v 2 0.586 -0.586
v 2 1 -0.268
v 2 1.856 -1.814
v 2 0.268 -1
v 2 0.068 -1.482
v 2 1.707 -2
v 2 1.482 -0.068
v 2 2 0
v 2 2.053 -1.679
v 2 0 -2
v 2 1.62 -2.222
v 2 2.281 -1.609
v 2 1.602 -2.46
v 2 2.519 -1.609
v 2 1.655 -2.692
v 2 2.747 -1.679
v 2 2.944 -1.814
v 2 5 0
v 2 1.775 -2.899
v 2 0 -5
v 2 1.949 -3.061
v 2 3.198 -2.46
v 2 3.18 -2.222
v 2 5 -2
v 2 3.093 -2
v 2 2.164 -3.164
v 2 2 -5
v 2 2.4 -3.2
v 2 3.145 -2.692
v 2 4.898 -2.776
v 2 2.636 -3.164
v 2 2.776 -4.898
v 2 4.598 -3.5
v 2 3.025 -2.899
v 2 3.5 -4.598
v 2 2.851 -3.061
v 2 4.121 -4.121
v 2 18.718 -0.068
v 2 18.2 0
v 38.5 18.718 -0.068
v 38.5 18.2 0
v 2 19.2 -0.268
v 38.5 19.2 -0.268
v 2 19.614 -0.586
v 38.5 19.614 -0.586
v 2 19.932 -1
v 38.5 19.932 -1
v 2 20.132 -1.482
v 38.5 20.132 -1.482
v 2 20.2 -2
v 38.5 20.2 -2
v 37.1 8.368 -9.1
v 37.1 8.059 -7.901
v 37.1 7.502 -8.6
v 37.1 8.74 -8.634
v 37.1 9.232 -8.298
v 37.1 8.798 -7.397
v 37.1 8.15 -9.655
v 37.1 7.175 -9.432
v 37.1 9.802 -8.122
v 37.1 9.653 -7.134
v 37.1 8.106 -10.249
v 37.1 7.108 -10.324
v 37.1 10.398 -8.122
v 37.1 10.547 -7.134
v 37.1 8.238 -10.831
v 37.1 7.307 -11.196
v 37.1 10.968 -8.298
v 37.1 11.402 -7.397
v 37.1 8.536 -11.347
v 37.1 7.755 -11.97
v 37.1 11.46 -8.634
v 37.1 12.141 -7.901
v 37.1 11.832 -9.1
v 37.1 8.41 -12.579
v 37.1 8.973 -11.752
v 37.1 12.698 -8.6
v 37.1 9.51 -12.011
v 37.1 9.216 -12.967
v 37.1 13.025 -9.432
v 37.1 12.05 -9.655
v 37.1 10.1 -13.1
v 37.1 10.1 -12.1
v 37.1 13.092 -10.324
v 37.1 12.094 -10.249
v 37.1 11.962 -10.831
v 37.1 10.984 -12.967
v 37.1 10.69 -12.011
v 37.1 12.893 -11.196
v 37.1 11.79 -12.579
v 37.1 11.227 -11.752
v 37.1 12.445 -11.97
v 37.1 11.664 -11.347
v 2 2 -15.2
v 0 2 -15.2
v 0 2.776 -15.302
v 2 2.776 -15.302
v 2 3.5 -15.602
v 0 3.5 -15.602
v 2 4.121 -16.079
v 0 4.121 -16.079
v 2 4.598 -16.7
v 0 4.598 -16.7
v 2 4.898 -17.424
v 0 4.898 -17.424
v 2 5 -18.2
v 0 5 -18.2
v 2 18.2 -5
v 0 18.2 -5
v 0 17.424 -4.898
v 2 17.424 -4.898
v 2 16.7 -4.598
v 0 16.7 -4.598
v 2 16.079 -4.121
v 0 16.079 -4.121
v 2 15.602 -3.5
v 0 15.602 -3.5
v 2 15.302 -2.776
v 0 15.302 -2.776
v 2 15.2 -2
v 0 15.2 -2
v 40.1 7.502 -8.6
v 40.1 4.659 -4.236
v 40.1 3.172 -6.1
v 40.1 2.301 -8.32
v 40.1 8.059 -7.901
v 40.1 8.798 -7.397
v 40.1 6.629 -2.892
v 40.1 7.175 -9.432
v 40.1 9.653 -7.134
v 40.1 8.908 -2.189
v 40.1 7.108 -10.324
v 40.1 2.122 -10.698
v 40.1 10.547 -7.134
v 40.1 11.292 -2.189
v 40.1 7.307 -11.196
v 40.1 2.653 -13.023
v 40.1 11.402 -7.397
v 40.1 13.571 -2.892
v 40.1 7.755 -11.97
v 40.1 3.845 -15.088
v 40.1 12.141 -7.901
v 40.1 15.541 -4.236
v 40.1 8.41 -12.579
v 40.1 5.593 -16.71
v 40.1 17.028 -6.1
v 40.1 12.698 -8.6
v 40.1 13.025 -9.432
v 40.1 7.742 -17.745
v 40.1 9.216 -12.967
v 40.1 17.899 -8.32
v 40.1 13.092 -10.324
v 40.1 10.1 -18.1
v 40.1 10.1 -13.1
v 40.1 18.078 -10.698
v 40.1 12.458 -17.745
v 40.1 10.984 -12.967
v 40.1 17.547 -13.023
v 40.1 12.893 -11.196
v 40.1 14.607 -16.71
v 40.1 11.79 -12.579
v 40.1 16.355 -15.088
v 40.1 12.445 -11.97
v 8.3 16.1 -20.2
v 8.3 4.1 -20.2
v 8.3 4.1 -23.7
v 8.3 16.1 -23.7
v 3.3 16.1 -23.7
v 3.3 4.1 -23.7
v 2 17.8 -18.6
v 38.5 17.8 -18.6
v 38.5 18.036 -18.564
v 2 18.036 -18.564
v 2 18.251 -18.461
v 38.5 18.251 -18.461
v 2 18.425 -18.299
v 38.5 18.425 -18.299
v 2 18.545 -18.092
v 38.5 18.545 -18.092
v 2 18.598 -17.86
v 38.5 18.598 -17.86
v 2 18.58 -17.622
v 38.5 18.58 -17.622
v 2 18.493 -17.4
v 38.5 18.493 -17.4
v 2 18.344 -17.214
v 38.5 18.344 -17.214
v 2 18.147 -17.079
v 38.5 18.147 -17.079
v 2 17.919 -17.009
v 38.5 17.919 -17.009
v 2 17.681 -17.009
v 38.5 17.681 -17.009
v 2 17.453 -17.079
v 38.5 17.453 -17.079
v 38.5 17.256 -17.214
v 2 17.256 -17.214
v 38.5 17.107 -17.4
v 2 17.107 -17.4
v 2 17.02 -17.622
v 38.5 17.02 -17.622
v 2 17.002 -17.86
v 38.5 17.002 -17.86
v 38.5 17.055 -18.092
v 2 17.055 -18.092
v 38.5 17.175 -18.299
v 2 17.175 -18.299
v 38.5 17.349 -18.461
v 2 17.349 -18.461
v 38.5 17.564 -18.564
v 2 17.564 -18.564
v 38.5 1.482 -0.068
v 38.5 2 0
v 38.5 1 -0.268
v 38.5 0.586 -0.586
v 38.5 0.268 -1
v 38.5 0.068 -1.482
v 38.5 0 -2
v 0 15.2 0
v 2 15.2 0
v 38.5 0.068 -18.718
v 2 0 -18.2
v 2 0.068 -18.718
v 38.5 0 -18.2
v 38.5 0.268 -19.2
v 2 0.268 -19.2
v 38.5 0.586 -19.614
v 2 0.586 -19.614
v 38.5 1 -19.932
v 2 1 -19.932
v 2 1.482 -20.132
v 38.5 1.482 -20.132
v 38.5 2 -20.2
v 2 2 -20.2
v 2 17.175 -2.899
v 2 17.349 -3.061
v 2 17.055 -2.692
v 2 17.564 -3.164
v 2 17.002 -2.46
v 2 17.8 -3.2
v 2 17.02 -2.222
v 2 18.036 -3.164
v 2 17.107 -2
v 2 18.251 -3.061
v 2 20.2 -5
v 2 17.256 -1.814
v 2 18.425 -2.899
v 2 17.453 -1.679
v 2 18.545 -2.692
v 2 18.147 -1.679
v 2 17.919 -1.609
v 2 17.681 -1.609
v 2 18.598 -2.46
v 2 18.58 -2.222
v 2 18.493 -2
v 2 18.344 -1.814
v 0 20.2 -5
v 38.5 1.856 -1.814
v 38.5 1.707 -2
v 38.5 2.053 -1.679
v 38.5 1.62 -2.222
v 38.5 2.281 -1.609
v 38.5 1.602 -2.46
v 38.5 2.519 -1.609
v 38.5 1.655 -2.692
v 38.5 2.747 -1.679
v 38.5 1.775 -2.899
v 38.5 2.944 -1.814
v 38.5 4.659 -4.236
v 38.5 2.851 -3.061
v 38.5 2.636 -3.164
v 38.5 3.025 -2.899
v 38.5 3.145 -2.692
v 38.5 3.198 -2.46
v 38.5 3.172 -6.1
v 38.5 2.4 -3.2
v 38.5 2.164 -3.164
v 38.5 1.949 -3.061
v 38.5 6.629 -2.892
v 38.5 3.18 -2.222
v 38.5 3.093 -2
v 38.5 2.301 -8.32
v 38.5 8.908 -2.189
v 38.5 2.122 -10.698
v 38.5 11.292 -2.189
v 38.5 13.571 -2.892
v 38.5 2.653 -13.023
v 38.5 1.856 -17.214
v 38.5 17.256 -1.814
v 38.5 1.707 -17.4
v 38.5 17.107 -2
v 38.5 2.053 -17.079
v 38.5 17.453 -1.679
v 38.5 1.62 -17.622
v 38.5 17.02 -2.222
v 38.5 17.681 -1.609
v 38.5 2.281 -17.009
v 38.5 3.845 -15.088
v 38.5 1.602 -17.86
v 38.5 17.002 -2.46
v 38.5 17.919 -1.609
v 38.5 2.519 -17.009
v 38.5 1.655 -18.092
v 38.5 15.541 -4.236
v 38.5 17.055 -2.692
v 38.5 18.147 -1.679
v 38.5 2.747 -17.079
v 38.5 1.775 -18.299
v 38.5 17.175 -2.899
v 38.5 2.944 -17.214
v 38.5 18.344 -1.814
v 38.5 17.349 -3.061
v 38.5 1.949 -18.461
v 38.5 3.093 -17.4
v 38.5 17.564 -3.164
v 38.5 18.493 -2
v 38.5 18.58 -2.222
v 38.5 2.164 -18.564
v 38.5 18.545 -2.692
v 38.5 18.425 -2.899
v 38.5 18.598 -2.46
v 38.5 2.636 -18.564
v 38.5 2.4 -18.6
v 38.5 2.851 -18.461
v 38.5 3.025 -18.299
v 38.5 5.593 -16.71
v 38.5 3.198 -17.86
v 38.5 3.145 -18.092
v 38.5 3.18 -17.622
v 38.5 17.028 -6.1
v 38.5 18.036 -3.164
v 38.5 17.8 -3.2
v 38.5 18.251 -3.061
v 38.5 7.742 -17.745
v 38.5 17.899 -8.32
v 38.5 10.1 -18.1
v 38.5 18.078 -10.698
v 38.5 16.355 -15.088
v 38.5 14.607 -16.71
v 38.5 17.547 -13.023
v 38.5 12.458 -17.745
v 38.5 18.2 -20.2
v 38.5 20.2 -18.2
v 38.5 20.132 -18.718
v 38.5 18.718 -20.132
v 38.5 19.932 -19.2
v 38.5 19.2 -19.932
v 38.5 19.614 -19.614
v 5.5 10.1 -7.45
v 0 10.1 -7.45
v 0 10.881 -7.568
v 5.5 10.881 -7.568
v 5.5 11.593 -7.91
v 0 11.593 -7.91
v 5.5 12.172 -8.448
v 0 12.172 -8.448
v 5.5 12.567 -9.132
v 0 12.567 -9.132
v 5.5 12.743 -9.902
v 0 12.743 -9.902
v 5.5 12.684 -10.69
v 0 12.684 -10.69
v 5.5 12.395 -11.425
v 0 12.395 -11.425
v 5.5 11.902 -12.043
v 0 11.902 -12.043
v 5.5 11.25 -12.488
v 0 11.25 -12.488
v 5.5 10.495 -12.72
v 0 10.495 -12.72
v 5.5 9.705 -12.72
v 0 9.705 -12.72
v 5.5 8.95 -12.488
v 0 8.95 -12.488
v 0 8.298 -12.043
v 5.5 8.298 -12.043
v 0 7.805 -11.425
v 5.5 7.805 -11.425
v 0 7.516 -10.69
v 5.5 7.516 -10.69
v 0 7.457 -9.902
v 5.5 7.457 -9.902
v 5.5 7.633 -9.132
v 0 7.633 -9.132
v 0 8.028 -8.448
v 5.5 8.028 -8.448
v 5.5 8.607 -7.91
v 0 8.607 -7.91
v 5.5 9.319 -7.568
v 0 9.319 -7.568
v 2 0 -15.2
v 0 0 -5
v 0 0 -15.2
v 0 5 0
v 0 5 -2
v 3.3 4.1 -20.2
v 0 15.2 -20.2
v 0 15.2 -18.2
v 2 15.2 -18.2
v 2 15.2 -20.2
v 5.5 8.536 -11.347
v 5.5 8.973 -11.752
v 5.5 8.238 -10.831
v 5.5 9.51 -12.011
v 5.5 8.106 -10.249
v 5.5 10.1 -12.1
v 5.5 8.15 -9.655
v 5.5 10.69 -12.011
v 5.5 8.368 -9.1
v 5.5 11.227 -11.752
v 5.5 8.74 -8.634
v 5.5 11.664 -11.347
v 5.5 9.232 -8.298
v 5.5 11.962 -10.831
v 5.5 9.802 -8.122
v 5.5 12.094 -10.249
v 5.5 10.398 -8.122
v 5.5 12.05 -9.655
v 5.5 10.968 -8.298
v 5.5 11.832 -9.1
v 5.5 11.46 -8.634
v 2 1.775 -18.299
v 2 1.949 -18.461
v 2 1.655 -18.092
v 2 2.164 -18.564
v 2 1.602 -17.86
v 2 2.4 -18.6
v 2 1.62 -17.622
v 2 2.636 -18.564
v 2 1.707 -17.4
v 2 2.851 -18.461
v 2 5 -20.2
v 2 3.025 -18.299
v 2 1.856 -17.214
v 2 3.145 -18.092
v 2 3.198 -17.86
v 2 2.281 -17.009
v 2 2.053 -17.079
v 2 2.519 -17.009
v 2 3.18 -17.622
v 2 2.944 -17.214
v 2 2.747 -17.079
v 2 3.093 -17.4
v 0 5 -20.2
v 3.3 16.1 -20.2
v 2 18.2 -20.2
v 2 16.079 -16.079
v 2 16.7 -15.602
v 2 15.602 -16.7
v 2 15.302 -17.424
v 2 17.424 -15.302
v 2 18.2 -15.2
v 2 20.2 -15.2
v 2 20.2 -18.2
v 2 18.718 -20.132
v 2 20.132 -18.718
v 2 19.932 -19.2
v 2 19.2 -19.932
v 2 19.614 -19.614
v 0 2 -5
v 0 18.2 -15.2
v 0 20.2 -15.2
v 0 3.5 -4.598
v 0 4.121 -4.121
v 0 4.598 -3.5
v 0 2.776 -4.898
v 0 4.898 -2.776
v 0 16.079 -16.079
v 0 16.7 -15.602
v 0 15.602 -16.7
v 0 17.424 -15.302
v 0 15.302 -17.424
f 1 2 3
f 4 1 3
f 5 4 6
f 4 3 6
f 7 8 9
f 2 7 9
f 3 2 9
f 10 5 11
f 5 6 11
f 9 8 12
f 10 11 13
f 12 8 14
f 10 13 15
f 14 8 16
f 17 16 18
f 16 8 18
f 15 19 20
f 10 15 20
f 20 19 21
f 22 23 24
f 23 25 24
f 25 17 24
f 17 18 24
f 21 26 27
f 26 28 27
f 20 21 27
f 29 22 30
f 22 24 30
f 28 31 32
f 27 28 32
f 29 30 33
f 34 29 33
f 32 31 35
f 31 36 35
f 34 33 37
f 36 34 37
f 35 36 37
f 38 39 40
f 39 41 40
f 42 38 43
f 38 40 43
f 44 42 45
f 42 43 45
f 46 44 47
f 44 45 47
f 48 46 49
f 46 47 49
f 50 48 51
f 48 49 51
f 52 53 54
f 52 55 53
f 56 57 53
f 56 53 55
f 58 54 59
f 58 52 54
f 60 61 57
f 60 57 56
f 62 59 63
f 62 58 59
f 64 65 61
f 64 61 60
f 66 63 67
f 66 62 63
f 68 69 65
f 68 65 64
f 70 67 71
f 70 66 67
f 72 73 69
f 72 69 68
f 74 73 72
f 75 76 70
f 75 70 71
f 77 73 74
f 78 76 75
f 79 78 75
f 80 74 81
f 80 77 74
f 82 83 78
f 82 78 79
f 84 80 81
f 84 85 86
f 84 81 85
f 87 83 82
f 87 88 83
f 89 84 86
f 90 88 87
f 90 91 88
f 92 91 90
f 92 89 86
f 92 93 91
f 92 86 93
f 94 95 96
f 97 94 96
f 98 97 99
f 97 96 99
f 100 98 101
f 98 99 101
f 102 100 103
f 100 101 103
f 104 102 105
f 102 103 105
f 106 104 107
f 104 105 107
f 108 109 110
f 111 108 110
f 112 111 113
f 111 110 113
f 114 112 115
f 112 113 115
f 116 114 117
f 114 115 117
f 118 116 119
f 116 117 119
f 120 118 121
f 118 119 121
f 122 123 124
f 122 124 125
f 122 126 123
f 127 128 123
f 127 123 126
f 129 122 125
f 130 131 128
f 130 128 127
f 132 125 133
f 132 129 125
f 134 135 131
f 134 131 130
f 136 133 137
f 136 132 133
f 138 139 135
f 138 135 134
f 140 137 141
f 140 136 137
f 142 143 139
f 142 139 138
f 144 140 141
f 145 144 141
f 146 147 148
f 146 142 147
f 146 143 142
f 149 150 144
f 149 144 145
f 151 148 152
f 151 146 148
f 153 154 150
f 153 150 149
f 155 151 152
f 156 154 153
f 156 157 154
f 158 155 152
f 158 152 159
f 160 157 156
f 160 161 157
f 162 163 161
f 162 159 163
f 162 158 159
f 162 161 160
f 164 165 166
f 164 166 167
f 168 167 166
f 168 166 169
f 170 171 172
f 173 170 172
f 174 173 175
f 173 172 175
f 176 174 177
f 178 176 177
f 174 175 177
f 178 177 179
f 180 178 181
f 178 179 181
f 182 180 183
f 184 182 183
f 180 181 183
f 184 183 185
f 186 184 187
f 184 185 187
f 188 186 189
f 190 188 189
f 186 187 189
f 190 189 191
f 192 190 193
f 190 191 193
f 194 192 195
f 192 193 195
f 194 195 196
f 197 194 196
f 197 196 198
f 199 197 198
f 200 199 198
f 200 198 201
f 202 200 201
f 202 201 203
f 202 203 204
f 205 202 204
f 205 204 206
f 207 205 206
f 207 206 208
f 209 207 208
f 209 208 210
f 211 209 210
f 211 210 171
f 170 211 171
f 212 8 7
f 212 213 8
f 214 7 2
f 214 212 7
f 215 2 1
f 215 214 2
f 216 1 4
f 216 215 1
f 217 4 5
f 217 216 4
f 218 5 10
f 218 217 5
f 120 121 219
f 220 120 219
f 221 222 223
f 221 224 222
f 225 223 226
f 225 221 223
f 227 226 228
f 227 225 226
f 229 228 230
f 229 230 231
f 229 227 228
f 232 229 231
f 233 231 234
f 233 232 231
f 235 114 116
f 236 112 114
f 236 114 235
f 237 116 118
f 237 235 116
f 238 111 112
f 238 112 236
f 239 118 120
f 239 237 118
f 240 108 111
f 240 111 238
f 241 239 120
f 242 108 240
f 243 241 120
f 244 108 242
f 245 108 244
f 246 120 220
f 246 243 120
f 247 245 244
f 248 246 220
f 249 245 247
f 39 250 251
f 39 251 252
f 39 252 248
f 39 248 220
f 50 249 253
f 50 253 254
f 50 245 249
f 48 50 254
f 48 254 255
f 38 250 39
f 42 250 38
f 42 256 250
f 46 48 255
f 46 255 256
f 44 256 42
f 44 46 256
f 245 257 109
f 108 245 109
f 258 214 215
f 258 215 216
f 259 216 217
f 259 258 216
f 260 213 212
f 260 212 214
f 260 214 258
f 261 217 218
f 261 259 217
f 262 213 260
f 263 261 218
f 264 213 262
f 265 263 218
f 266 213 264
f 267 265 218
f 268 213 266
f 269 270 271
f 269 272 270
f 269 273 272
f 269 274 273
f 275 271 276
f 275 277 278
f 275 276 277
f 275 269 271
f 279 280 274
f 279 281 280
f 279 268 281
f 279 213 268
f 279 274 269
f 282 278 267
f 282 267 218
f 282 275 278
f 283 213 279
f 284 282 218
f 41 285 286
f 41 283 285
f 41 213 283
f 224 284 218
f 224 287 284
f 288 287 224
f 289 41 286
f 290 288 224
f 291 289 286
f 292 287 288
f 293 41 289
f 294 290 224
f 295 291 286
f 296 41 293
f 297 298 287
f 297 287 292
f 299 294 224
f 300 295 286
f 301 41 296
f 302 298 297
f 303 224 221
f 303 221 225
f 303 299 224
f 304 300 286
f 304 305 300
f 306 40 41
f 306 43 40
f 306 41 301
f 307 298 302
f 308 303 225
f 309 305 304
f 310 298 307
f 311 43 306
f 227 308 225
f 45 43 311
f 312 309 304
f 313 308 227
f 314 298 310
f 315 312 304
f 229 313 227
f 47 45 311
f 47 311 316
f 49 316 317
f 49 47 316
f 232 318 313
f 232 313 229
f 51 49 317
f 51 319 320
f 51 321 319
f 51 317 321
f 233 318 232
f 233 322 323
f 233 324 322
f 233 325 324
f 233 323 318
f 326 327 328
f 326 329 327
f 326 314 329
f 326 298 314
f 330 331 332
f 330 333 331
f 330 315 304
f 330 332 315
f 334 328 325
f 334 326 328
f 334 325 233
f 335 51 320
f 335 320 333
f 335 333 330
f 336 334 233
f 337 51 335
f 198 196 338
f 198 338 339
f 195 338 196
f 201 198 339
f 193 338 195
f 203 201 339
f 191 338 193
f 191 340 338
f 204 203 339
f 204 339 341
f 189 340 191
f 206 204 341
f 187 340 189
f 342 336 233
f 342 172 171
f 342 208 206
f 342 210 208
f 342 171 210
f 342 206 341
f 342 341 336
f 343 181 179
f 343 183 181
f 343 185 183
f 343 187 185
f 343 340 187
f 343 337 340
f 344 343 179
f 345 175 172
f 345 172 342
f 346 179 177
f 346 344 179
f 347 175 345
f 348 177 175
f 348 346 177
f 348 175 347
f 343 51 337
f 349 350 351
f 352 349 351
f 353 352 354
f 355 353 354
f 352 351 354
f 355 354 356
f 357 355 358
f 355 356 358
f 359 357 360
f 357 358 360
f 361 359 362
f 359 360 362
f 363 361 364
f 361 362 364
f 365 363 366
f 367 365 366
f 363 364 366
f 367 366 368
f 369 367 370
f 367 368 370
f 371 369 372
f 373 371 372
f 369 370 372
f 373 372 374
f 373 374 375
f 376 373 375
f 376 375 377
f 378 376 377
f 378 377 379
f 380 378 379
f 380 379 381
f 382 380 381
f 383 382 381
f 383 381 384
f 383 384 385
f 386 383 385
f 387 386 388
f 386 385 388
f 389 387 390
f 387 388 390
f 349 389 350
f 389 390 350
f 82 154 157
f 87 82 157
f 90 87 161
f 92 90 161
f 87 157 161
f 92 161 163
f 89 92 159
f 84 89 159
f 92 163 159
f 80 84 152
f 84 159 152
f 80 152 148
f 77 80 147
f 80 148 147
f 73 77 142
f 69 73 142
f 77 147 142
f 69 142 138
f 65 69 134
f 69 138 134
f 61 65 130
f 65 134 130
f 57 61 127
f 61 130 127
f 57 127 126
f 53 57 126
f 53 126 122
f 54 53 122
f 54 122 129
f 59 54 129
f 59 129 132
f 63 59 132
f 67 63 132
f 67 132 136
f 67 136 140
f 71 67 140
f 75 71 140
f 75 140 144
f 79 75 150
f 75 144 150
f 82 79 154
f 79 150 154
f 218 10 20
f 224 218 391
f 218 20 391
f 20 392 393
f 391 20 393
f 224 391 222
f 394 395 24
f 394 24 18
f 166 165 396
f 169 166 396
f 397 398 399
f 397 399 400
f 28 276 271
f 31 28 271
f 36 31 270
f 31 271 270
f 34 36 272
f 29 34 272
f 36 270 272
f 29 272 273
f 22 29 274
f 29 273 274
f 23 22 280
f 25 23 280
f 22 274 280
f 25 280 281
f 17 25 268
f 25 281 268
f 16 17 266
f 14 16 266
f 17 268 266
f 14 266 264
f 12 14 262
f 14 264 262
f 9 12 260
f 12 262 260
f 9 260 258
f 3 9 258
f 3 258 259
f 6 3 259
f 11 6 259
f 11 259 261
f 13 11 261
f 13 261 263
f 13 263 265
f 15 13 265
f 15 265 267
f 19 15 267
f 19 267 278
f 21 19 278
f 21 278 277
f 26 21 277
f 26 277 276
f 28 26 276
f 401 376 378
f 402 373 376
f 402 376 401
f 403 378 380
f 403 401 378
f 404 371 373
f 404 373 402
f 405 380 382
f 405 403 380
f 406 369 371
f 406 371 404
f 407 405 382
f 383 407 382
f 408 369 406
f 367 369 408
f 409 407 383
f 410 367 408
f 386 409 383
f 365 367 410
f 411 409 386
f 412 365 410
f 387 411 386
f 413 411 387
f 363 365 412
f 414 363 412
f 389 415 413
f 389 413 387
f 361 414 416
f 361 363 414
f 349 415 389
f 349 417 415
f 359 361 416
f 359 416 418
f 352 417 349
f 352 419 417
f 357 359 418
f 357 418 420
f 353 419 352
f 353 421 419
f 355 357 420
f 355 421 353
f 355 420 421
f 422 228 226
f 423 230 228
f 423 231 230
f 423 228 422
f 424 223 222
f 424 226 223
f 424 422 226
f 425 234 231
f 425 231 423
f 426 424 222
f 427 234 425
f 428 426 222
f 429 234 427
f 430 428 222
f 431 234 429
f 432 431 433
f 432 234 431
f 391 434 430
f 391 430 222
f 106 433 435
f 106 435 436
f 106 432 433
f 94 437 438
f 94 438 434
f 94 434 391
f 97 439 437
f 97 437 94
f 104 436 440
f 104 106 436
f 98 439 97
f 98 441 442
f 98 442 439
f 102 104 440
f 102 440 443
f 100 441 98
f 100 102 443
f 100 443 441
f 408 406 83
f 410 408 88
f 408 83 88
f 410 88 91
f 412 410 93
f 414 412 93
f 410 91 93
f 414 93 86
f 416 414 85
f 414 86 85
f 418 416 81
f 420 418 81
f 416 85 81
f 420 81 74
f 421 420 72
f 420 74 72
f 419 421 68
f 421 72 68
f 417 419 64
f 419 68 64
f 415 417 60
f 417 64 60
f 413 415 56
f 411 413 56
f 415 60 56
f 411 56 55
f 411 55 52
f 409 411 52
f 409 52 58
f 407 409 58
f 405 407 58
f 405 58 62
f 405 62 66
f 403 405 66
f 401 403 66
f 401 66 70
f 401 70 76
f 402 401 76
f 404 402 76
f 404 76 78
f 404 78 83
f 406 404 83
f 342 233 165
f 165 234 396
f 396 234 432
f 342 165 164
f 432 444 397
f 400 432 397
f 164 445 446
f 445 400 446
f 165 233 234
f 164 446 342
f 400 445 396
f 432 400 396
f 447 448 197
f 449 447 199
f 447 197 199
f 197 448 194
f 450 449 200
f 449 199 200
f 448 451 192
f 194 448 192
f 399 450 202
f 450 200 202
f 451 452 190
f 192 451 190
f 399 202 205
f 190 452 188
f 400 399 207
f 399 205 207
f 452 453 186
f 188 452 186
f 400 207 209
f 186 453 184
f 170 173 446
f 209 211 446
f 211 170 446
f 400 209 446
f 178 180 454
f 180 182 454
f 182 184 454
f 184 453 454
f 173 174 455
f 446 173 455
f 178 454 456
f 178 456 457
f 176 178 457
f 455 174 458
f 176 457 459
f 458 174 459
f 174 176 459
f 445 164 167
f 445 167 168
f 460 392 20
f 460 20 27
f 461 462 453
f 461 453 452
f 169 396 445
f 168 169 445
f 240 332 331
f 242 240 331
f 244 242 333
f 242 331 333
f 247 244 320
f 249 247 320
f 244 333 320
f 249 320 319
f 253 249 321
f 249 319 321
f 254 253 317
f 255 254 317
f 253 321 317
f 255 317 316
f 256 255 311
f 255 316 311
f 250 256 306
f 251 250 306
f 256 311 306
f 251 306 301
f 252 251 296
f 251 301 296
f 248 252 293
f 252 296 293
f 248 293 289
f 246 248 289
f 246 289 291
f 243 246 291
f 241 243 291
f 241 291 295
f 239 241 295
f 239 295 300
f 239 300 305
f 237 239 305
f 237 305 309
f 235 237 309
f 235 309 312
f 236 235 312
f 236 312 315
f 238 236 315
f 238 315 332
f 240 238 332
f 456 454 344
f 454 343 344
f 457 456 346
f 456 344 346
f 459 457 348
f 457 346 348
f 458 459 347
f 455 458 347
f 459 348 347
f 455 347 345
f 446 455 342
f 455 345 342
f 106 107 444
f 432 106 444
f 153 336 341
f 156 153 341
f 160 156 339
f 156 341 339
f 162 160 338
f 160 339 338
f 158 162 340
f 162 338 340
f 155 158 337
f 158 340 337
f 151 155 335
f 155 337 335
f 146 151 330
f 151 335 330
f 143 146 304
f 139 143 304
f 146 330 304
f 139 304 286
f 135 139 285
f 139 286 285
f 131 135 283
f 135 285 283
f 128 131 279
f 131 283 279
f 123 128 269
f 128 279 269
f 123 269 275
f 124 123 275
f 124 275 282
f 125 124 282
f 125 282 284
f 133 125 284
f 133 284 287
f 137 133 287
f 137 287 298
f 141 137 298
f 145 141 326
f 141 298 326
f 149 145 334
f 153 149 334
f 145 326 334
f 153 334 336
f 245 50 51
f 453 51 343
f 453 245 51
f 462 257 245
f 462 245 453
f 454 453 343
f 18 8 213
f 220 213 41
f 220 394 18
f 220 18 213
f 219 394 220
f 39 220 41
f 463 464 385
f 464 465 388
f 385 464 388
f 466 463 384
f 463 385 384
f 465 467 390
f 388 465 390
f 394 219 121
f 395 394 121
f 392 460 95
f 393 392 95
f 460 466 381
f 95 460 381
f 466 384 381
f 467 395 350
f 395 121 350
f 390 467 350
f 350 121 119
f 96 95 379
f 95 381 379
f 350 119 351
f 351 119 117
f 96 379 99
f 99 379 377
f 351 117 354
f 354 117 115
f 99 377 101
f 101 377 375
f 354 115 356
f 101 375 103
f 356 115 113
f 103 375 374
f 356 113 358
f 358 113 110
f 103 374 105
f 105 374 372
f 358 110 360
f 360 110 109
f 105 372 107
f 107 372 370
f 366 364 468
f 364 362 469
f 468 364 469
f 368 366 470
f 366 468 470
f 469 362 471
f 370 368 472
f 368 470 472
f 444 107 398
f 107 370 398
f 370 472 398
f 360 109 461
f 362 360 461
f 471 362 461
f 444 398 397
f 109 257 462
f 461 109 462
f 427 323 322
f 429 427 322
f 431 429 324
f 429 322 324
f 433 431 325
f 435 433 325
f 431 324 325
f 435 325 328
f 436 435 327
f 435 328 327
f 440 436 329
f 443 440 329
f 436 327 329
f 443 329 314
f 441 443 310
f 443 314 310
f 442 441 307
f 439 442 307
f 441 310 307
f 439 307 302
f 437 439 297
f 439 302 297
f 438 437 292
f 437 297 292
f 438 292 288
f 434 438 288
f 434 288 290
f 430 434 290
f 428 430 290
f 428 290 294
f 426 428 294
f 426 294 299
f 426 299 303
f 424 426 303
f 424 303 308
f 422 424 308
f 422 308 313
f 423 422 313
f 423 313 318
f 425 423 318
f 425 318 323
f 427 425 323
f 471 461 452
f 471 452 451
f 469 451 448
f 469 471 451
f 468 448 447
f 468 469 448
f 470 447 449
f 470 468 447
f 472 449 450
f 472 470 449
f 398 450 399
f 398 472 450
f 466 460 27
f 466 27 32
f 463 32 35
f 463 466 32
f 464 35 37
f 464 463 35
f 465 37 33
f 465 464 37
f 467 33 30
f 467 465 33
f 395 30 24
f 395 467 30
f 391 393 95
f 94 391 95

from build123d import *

# Parameters (mm, degrees)
SKETCH_1_W          = 20.2
SKETCH_1_H          = 20.2
EXTRUDE_1_DEPTH     = 38.5
SKETCH_2_R          = 8
EXTRUDE_2_DEPTH     = 1.6
CUT_EXTRUDE_1_DEPTH = 2
M2X0_41_D           = 1.6
FILLET_1_R          = 2
SKETCH_7_R          = 2
CUT_EXTRUDE_2_DEPTH = 41.1
SKETCH_8_R          = 2.65
CUT_EXTRUDE_3_DEPTH = 5.5
SKETCH_9_R          = 3
CUT_EXTRUDE_4_DEPTH = 3
SKETCH_10_W         = 5
SKETCH_10_H         = 12
EXTRUDE_3_DEPTH     = 3.5


with BuildPart() as part:
    # Эскиз1 → Бобышка-Вытянуть1 (new body)
    with BuildSketch(Plane(origin=(0, 0, 0), x_dir=(0, 0, -1), z_dir=(1, 0, 0))):
        with Locations((10.1, 10.1)):
            Rectangle(SKETCH_1_W, SKETCH_1_H)
    extrude(amount=EXTRUDE_1_DEPTH)

    # Эскиз2 → Бобышка-Вытянуть2 (add)
    with BuildSketch(Plane(origin=(38.5, 0, 0), x_dir=(0, 0, -1), z_dir=(1, 0, 0))):
        with Locations((10.1, 10.1)):
            Circle(SKETCH_2_R)
    extrude(amount=EXTRUDE_2_DEPTH)

    # Эскиз3 → Вырез-Вытянуть1 (cut)
    with BuildSketch(Plane.ZY):
        with BuildLine():
            Line((-5, 20.2), (-5, 18.2))
            ThreePointArc((-5, 18.2), (-4.121320344, 16.078679656), (-2, 15.2))
            Line((-2, 15.2), (0, 15.2))
            Line((0, 15.2), (0, 20.2))
            Line((0, 20.2), (-5, 20.2))
        make_face()
        with BuildLine():
            Line((-20.2, 20.2), (-15.2, 20.2))
            Line((-15.2, 20.2), (-15.2, 18.2))
            ThreePointArc((-15.2, 18.2), (-16.078679656, 16.078679656), (-18.2, 15.2))
            Line((-18.2, 15.2), (-20.2, 15.2))
            Line((-20.2, 15.2), (-20.2, 20.2))
        make_face()
        with BuildLine():
            Line((0, 0), (-5, 0))
            Line((-5, 0), (-5, 2))
            ThreePointArc((-5, 2), (-4.121320344, 4.121320344), (-2, 5))
            Line((-2, 5), (0, 5))
            Line((0, 5), (0, 0))
        make_face()
        with BuildLine():
            Line((-15.2, 0), (-15.2, 2))
            ThreePointArc((-15.2, 2), (-16.078679656, 4.121320344), (-18.2, 5))
            Line((-18.2, 5), (-20.2, 5))
            Line((-20.2, 5), (-20.2, 0))
            Line((-20.2, 0), (-15.2, 0))
        make_face()
    extrude(amount=-CUT_EXTRUDE_1_DEPTH, mode=Mode.SUBTRACT)

    # Отверстие обработанное метчиком M2x0.41 (through all)
    with Locations(Plane.ZY.offset(-2)):
        with Locations((-17.8, 17.8), (-2.4, 17.8), (-2.4, 2.4), (-17.8, 2.4)):
            Hole(M2X0_41_D / 2)

    # Скругление1
    fillet_1_edges = [part.edges().sort_by_distance(p)[0] for p in [
        (20.25, 20.2, 0),
        (20.25, 20.2, -20.2),
        (20.25, 0, -20.2),
        (20.25, 0, 0),
    ]]
    fillet(fillet_1_edges, radius=FILLET_1_R)

    # Эскиз7 → Вырез-Вытянуть2 (cut, through all)
    with BuildSketch(Plane(origin=(40.1, 0, 0), x_dir=(0, 0, -1), z_dir=(1, 0, 0))):
        with Locations((10.1, 10.1)):
            Circle(SKETCH_7_R)
    extrude(amount=-CUT_EXTRUDE_2_DEPTH, mode=Mode.SUBTRACT)

    # Эскиз8 → Вырез-Вытянуть3 (cut)
    with BuildSketch(Plane.ZY):
        with Locations((-10.1, 10.1)):
            Circle(SKETCH_8_R)
    extrude(amount=-CUT_EXTRUDE_3_DEPTH, mode=Mode.SUBTRACT)

    # Эскиз9 → Вырез-Вытянуть4 (cut)
    with BuildSketch(Plane(origin=(40.1, 0, 0), x_dir=(0, 0, -1), z_dir=(1, 0, 0))):
        with Locations((10.1, 10.1)):
            Circle(SKETCH_9_R)
    extrude(amount=-CUT_EXTRUDE_4_DEPTH, mode=Mode.SUBTRACT)

    # Эскиз10 → Бобышка-Вытянуть3 (add)
    with BuildSketch(Plane(origin=(0, 0, -20.2), x_dir=(-1, 0, 0), z_dir=(0, 0, -1))):
        with Locations((-5.8, 10.1)):
            Rectangle(SKETCH_10_W, SKETCH_10_H)
    extrude(amount=EXTRUDE_3_DEPTH)


solid = part.part
